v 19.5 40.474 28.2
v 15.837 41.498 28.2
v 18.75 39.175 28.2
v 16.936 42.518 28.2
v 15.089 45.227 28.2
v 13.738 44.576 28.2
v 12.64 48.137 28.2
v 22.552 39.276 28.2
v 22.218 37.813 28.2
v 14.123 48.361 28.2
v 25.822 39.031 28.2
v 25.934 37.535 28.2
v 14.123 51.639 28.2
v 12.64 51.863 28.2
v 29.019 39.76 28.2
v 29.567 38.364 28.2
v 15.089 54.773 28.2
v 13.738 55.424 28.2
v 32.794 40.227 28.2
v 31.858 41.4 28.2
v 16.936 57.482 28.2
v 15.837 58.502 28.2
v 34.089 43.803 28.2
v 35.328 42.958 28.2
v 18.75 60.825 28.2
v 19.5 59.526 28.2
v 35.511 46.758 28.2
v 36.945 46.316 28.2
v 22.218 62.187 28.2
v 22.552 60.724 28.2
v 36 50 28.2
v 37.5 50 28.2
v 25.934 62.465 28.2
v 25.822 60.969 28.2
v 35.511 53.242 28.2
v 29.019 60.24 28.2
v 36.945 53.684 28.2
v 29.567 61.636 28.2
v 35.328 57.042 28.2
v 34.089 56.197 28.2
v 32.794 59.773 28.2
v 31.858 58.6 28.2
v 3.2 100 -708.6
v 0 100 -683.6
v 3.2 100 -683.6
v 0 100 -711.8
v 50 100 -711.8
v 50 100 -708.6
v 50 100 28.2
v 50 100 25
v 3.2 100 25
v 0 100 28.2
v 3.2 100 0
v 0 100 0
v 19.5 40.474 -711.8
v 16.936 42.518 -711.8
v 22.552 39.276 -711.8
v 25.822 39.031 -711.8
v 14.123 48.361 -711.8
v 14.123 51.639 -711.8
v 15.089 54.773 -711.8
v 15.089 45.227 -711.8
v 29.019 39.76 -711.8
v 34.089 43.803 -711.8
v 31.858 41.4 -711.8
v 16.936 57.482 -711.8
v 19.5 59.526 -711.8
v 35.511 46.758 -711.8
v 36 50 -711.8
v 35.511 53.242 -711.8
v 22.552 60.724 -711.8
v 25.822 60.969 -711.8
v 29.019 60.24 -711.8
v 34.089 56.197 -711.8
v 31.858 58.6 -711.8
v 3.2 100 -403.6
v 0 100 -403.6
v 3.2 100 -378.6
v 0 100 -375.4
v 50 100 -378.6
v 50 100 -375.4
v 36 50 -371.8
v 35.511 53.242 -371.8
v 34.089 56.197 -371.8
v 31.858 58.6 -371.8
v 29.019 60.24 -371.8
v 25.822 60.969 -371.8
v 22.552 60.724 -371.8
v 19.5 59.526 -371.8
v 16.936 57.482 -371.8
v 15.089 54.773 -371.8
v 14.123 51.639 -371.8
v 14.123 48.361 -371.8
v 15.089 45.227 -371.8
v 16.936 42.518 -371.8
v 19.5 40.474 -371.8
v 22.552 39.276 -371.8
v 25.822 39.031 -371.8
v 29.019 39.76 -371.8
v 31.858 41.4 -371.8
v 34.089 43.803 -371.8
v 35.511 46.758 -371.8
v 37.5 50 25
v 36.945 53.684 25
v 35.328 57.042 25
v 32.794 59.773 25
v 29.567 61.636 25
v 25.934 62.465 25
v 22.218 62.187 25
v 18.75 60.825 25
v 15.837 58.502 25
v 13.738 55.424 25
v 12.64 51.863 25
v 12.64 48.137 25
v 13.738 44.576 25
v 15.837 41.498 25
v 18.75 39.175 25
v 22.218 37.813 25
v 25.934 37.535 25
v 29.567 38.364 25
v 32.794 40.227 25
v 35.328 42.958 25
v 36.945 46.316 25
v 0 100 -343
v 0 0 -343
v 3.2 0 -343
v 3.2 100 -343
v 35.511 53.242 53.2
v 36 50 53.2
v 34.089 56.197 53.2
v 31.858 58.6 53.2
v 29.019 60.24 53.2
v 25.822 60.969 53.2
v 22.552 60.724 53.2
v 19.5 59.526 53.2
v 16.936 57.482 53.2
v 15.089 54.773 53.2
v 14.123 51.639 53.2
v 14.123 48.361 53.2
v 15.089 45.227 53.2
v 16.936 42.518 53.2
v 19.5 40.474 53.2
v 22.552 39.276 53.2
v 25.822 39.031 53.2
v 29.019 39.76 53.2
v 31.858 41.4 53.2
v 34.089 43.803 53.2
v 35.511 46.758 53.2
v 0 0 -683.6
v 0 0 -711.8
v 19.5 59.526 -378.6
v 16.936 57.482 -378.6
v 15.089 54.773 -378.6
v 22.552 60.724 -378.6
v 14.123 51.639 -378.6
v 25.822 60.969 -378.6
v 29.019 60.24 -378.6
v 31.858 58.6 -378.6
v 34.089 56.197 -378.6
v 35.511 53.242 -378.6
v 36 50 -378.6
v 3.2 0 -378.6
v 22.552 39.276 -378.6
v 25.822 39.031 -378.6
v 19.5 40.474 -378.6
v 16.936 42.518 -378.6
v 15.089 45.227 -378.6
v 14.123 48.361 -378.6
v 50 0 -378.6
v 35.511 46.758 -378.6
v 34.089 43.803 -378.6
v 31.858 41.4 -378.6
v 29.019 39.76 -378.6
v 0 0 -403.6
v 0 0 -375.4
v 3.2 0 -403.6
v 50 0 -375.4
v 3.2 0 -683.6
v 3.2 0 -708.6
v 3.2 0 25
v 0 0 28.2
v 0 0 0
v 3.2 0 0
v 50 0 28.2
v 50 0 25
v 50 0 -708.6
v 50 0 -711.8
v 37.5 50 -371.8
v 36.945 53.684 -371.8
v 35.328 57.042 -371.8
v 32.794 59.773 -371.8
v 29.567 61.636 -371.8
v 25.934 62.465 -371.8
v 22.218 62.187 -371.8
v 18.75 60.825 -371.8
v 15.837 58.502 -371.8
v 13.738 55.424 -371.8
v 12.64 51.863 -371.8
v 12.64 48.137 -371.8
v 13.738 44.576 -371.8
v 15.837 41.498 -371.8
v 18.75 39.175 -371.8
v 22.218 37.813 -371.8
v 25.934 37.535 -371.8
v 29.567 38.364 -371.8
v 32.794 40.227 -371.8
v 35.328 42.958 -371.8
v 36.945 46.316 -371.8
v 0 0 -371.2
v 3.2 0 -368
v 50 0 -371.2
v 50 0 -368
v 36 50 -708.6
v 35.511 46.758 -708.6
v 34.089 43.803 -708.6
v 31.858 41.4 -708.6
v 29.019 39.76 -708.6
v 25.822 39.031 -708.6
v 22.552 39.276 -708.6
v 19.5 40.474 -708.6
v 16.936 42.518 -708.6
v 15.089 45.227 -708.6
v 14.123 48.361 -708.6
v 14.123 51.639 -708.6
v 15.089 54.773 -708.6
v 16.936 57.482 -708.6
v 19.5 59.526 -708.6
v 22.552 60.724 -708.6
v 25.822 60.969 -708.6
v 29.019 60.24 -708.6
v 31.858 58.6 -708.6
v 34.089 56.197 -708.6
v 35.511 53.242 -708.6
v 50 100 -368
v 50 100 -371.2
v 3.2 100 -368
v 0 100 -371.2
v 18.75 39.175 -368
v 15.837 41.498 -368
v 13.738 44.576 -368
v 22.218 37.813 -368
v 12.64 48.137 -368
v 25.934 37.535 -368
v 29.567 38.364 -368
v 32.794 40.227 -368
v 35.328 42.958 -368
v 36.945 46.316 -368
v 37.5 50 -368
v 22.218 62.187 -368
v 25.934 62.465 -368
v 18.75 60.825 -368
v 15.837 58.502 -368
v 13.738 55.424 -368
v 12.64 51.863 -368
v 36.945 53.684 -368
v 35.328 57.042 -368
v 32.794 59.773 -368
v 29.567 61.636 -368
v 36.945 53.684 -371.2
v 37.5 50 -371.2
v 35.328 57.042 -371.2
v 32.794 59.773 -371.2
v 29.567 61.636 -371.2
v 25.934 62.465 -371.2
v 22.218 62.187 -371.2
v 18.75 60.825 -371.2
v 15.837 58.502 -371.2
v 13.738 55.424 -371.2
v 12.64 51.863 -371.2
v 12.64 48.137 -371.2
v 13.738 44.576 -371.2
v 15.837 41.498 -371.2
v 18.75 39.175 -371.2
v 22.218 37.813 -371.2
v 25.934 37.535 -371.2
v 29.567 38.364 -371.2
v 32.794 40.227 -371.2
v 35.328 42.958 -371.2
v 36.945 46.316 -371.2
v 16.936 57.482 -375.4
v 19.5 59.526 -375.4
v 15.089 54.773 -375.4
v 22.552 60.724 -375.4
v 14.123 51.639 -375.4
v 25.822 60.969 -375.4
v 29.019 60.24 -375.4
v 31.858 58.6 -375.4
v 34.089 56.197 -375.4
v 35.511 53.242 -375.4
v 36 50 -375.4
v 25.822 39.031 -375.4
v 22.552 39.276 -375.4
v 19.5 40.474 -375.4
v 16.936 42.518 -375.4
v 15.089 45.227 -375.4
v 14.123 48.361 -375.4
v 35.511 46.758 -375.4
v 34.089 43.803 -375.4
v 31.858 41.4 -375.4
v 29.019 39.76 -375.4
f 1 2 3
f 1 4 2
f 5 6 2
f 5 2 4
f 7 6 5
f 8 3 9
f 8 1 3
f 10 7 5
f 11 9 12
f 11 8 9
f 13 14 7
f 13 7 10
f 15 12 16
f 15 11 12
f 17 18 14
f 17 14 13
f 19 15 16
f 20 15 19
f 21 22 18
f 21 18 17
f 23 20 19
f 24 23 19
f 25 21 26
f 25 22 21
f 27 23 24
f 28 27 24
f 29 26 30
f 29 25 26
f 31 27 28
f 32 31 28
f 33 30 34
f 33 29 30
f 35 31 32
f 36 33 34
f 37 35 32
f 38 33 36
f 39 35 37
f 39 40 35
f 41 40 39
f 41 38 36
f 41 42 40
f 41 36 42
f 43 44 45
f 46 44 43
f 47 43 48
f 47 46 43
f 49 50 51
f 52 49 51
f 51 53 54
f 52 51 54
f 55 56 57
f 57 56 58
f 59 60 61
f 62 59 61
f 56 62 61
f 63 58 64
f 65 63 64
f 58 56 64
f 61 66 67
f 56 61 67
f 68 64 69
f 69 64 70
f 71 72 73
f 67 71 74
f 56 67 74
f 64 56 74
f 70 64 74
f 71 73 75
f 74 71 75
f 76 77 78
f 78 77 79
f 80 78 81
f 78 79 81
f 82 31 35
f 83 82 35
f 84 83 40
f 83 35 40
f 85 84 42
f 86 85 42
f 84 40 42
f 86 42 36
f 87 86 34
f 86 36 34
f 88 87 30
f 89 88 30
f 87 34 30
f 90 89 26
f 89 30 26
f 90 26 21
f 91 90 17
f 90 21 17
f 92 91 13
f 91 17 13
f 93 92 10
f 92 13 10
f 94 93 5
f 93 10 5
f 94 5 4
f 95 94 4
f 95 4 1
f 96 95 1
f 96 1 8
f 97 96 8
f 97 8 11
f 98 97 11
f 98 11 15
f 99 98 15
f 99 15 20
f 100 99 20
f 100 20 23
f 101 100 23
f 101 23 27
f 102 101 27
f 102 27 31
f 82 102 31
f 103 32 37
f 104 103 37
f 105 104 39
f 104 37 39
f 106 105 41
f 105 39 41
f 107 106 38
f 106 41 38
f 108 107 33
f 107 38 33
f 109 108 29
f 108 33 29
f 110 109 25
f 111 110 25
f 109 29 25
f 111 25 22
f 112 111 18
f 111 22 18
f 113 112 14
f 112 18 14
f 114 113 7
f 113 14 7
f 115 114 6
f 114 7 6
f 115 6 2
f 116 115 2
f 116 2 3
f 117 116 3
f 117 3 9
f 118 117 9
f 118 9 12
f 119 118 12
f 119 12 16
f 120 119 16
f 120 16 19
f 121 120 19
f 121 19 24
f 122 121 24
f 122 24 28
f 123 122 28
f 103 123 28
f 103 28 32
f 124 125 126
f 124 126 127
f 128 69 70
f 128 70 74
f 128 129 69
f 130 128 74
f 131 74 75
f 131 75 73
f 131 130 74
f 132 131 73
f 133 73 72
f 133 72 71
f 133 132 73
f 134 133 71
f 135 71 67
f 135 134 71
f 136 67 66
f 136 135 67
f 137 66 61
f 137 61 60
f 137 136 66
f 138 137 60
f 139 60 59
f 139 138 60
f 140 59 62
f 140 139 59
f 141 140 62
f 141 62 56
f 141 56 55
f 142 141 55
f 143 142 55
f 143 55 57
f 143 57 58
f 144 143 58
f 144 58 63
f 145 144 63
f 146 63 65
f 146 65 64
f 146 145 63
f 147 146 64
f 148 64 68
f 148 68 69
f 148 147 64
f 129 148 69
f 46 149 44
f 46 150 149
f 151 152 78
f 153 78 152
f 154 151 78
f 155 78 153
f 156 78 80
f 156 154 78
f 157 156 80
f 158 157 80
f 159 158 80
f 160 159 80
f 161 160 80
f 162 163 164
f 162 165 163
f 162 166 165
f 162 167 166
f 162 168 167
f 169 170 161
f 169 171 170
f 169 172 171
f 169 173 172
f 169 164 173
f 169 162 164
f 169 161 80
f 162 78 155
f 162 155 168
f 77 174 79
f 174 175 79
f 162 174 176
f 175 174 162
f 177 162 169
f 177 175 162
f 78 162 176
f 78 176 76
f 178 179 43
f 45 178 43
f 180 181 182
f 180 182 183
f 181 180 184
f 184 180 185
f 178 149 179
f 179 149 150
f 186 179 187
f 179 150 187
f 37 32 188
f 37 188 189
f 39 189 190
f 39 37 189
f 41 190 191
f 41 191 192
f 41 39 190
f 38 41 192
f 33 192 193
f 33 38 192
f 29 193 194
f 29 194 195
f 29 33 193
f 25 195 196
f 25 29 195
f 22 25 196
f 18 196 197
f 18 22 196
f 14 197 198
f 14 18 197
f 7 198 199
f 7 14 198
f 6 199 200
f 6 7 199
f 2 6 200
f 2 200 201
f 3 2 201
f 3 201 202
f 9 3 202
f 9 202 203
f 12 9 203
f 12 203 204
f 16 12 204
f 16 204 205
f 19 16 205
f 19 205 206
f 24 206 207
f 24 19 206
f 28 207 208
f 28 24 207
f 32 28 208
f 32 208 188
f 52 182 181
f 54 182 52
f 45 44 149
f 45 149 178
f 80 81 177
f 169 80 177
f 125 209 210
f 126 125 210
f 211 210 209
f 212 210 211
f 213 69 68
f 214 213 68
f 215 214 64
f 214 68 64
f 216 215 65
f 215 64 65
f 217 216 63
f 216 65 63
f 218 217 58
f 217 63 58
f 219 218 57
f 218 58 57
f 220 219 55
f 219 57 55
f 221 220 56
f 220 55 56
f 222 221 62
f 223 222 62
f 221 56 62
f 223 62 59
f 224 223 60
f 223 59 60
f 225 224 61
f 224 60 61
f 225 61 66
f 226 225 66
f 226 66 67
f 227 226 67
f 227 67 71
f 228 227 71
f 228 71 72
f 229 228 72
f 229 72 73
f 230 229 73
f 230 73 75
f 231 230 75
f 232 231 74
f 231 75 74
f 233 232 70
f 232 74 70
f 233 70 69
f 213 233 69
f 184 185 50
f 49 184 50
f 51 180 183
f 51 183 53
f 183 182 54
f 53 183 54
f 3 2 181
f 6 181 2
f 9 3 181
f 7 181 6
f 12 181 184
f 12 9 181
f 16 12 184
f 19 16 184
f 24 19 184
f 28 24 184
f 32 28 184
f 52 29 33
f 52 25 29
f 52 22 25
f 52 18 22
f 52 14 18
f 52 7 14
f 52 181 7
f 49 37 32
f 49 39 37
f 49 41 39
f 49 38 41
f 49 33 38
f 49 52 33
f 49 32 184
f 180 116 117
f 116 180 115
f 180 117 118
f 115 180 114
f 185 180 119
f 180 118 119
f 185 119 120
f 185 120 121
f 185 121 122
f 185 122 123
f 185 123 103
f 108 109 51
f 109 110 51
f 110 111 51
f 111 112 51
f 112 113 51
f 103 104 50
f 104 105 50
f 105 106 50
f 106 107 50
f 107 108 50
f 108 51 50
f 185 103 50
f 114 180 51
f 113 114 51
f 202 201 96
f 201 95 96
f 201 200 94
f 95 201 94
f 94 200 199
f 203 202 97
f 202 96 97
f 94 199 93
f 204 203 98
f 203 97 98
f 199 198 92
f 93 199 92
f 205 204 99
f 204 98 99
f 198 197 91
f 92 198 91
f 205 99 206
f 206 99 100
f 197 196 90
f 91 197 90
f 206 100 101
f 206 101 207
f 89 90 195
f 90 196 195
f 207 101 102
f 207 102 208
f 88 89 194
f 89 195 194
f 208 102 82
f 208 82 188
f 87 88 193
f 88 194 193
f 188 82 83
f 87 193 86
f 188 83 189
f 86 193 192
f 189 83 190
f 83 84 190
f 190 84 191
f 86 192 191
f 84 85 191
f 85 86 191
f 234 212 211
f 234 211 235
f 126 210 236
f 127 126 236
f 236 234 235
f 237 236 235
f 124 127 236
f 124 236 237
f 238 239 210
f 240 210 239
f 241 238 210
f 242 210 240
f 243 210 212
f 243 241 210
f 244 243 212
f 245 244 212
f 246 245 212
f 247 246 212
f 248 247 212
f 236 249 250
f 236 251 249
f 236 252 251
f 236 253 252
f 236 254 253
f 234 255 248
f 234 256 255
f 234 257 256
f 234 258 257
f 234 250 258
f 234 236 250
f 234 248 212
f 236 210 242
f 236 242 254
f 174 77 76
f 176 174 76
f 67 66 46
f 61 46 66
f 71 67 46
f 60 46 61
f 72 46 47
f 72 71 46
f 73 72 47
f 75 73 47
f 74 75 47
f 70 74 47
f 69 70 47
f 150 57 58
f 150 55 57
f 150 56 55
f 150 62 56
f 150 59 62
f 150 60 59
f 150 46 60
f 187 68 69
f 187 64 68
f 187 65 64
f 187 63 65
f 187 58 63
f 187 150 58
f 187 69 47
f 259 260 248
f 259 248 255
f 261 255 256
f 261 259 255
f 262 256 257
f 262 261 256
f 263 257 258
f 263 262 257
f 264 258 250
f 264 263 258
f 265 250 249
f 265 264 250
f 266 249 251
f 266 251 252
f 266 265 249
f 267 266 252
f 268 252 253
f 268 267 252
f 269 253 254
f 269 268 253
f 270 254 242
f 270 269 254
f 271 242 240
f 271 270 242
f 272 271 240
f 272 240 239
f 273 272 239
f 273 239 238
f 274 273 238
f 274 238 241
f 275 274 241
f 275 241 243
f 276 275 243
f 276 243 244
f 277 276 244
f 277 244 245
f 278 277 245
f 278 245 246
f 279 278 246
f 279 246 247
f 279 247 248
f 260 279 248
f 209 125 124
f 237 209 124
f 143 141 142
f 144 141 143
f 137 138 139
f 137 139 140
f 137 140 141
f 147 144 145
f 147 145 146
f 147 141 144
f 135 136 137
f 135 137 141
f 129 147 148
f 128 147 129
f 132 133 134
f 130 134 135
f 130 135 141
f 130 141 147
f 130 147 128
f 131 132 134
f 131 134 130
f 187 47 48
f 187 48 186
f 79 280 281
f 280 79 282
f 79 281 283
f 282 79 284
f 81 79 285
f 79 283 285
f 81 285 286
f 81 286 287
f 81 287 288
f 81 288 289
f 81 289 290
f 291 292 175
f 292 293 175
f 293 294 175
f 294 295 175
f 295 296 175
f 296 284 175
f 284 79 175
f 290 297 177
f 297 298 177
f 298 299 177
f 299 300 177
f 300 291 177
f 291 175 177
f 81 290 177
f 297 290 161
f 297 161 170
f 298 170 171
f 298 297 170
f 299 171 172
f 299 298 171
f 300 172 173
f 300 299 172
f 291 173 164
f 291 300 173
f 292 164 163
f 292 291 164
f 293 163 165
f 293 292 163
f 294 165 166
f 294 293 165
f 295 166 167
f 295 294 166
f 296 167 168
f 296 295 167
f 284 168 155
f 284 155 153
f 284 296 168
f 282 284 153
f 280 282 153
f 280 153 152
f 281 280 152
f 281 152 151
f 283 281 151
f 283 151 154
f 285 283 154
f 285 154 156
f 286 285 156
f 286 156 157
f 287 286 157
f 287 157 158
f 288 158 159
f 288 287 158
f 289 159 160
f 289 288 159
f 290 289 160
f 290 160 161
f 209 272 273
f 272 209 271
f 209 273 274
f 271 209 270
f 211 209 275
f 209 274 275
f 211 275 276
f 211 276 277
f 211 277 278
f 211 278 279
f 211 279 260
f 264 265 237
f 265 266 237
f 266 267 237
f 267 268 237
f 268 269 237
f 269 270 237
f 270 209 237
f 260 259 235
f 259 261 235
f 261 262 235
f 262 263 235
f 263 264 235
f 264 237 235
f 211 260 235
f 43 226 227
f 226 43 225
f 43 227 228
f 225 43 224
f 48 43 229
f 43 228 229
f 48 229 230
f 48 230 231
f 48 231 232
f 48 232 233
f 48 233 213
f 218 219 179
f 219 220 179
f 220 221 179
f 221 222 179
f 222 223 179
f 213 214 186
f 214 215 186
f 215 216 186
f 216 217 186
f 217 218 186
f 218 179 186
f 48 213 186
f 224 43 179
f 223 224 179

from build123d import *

# Parameters (mm, degrees)
F0_W          = 100
F0_H          = 25
F1_DEPTH      = 3.2
F2_W          = 46.8
F2_H          = 100
F2_W_2        = 3.2
F3_DEPTH      = 3.2
F4_R          = 12.5
F5_DEPTH      = 400
F7_T          = -1.5
F8_R          = 11
F9_DEPTH      = 25
F9_DEPTH_BACK = 740
F12_W         = 50
F12_H         = 100
F12_R         = 11
F13_DEPTH     = 3.2
F14_W         = 3.2
F14_H         = 100
F15_DEPTH     = 25


with BuildPart() as f1:
    # F0 (on Right) → F1 (new body)
    with BuildSketch(Plane.YZ):
        with Locations((50, 12.5)):
            Rectangle(F0_W, F0_H)
    extrude(amount=F1_DEPTH)

    # F2 (on face) → F3 (join)
    with BuildSketch(Plane.XY.offset(25)):
        with Locations((26.6, 50)):
            Rectangle(F2_W, F2_H)
        with Locations((1.6, 50)):
            Rectangle(F2_W_2, F2_H)
    extrude(amount=F3_DEPTH)


with BuildPart() as f5:
    # F4 (on face) → F5 (new body)
    with BuildSketch(Plane.XY.offset(28.2)):
        with Locations((25, 50)):
            Circle(F4_R)
    extrude(amount=-F5_DEPTH)


with BuildPart() as f1_1:
    add(f1.part)

    # F6: cut F5
    add(f5.part, mode=Mode.SUBTRACT)


with BuildPart() as f5_1:
    add(f5.part)

    # F7
    f7_openings = [f5_1.faces().sort_by_distance(p)[0] for p in [
        (25, 50, 28.2),
        (25, 50, -371.8),
    ]]
    offset(amount=F7_T, openings=f7_openings)


with BuildPart() as f9:
    # F8 (on face) → F9 (new body, two sides)
    with BuildSketch(Plane.XY.offset(28.2)) as f9_sk:
        with Locations((25, 50)):
            Circle(F8_R)
    extrude(amount=F9_DEPTH)
    extrude(f9_sk.sketch, amount=-F9_DEPTH_BACK)


with BuildPart() as f11_1:
    # F11: instance of F1
    add(f1_1.part.mirror(Plane.XY.offset(-171.5)))


with BuildPart() as f13:
    # F12 (on face) → F13 (new body)
    with BuildSketch(Plane(origin=(0, 0, -711.8), x_dir=(1, 0, 0), z_dir=(0, 0, -1))):
        with Locations((25, -50)):
            Rectangle(F12_W, F12_H)
        with Locations((25, -50)):
            Circle(F12_R, mode=Mode.SUBTRACT)
    extrude(amount=-F13_DEPTH)

    # F14 (on face) → F15 (join)
    with BuildSketch(Plane.XY.offset(-708.6)):
        with Locations((1.6, 50)):
            Rectangle(F14_W, F14_H)
    extrude(amount=F15_DEPTH)


with BuildPart() as f17_1:
    # F17: instance of F13
    add(f13.part.mirror(Plane(origin=(26.7414490953, 50, -543.6), x_dir=(1, 0, 0), z_dir=(0, 0, 1))))


solid = Compound([f1_1.part, f5_1.part, f9.part, f11_1.part, f13.part, f17_1.part])
